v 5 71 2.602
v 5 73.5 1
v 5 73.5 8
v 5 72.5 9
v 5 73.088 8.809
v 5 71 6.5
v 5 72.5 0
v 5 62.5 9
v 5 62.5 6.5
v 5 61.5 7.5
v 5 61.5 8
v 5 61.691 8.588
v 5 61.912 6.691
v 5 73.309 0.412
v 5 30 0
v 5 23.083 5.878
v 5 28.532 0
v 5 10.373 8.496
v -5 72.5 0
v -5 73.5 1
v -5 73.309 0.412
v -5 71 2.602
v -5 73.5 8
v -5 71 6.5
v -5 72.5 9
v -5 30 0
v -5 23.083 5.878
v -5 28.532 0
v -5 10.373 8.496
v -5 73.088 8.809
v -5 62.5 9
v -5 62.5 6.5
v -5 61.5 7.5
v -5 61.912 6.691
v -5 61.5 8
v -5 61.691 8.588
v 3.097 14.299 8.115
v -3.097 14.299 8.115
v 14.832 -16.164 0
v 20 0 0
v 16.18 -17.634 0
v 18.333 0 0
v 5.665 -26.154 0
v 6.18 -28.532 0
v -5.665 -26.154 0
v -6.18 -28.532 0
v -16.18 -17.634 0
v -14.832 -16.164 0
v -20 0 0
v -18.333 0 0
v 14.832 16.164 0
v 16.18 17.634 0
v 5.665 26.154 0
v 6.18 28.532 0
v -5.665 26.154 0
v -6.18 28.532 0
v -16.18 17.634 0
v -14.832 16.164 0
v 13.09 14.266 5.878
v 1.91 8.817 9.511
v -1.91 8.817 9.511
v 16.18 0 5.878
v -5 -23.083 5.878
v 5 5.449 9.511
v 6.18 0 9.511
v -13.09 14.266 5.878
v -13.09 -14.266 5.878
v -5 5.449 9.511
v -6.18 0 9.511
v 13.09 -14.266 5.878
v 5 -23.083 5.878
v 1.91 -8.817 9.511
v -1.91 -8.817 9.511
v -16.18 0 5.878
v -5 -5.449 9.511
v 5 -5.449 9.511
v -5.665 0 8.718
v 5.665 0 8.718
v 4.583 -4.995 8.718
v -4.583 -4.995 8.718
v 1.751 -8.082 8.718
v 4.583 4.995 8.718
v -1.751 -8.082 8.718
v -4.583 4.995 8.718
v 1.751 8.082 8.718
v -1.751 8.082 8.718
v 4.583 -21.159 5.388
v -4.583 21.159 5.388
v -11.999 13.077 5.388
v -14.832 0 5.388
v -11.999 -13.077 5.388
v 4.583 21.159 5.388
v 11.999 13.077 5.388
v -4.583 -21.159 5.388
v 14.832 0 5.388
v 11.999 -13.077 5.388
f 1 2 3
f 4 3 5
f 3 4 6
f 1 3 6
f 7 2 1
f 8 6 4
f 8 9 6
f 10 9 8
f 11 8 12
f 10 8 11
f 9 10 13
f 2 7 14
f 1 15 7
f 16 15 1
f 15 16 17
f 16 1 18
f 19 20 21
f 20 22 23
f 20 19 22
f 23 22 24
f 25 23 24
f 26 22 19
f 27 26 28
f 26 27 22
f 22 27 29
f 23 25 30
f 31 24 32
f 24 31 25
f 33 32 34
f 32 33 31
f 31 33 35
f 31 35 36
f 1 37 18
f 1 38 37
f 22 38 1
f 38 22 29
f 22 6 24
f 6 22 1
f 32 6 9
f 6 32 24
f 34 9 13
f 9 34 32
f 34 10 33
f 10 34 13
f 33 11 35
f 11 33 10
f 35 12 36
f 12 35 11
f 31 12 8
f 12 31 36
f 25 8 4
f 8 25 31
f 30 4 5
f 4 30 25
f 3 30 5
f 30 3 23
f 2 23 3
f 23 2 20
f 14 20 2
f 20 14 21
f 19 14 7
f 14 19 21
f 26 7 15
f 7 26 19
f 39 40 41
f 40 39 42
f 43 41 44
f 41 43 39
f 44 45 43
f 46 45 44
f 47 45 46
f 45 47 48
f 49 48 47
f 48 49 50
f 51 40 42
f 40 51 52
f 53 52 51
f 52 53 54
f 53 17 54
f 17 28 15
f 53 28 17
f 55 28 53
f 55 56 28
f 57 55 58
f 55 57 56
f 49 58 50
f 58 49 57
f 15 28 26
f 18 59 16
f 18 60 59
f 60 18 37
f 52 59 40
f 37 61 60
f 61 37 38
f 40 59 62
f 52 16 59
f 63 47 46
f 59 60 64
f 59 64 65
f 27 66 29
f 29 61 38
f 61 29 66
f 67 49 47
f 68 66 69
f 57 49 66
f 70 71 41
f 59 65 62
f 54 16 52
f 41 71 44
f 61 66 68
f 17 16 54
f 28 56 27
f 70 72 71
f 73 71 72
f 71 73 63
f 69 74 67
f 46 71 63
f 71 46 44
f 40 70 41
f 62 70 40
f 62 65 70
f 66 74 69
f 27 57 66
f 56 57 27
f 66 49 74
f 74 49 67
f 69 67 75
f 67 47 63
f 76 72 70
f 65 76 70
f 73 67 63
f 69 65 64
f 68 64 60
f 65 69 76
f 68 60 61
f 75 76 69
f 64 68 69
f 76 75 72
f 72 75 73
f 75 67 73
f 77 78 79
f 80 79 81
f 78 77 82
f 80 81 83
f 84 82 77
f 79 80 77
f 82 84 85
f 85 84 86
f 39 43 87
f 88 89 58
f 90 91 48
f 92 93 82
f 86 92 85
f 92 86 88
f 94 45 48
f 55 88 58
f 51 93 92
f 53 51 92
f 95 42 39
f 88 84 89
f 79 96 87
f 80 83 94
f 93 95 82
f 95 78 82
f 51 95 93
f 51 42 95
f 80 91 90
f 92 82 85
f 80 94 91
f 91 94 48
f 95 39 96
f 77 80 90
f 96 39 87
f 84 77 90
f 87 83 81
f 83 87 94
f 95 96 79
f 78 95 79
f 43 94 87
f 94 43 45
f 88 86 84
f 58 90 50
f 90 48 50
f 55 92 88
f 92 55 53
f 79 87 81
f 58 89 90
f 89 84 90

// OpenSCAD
$fn = 10;
rimThickness = 4 + 2; // Add 2x of the offset
gap = 3.8;
spoonInnerLength = 100;
scoopWidth = 40;
scoopLength = 60;
scoopDepth = 10;
wallThickness = 2.5;
handleWidth = 10;
// Handle goes half through the scoop.
handleLength = spoonInnerLength + wallThickness - scoopLength/2;
hookLength = 10;

module handle() {
    // Remove the 2x offset from the wall thickness
    adjWallThickness = wallThickness - 2;
    translate([wallThickness/2-0.25,0,0])
        linear_extrude(height = handleWidth, center = true)
            offset(r = 1)
                polygon([[0,0],
                    [0,handleLength],
                    [2*adjWallThickness+rimThickness,handleLength],
                    [2*adjWallThickness+rimThickness,handleLength-hookLength],
                    [adjWallThickness+rimThickness,handleLength-hookLength],
                    [adjWallThickness+rimThickness,handleLength-adjWallThickness],
                    [adjWallThickness,handleLength-adjWallThickness],
                    // Not sure why this is not just scoopDepth. Some proportion thing?
                    [scoopDepth-wallThickness,0]
                    ]);
}

module spoon() {
    difference() {
        union() {
            rotate([0,-90,0])
                handle();
            scale([scoopWidth/scoopLength,1,
                2*scoopDepth/scoopLength])
                sphere(d = scoopLength);
        }
        translate([0,0,-scoopLength/2])
            cube([scoopLength,scoopLength,scoopLength],
                center = true);
        scale([scoopWidth/scoopLength,1,
            2*scoopDepth/scoopLength])
            sphere(d = scoopLength-2*wallThickness);
    }
}

spoon();
